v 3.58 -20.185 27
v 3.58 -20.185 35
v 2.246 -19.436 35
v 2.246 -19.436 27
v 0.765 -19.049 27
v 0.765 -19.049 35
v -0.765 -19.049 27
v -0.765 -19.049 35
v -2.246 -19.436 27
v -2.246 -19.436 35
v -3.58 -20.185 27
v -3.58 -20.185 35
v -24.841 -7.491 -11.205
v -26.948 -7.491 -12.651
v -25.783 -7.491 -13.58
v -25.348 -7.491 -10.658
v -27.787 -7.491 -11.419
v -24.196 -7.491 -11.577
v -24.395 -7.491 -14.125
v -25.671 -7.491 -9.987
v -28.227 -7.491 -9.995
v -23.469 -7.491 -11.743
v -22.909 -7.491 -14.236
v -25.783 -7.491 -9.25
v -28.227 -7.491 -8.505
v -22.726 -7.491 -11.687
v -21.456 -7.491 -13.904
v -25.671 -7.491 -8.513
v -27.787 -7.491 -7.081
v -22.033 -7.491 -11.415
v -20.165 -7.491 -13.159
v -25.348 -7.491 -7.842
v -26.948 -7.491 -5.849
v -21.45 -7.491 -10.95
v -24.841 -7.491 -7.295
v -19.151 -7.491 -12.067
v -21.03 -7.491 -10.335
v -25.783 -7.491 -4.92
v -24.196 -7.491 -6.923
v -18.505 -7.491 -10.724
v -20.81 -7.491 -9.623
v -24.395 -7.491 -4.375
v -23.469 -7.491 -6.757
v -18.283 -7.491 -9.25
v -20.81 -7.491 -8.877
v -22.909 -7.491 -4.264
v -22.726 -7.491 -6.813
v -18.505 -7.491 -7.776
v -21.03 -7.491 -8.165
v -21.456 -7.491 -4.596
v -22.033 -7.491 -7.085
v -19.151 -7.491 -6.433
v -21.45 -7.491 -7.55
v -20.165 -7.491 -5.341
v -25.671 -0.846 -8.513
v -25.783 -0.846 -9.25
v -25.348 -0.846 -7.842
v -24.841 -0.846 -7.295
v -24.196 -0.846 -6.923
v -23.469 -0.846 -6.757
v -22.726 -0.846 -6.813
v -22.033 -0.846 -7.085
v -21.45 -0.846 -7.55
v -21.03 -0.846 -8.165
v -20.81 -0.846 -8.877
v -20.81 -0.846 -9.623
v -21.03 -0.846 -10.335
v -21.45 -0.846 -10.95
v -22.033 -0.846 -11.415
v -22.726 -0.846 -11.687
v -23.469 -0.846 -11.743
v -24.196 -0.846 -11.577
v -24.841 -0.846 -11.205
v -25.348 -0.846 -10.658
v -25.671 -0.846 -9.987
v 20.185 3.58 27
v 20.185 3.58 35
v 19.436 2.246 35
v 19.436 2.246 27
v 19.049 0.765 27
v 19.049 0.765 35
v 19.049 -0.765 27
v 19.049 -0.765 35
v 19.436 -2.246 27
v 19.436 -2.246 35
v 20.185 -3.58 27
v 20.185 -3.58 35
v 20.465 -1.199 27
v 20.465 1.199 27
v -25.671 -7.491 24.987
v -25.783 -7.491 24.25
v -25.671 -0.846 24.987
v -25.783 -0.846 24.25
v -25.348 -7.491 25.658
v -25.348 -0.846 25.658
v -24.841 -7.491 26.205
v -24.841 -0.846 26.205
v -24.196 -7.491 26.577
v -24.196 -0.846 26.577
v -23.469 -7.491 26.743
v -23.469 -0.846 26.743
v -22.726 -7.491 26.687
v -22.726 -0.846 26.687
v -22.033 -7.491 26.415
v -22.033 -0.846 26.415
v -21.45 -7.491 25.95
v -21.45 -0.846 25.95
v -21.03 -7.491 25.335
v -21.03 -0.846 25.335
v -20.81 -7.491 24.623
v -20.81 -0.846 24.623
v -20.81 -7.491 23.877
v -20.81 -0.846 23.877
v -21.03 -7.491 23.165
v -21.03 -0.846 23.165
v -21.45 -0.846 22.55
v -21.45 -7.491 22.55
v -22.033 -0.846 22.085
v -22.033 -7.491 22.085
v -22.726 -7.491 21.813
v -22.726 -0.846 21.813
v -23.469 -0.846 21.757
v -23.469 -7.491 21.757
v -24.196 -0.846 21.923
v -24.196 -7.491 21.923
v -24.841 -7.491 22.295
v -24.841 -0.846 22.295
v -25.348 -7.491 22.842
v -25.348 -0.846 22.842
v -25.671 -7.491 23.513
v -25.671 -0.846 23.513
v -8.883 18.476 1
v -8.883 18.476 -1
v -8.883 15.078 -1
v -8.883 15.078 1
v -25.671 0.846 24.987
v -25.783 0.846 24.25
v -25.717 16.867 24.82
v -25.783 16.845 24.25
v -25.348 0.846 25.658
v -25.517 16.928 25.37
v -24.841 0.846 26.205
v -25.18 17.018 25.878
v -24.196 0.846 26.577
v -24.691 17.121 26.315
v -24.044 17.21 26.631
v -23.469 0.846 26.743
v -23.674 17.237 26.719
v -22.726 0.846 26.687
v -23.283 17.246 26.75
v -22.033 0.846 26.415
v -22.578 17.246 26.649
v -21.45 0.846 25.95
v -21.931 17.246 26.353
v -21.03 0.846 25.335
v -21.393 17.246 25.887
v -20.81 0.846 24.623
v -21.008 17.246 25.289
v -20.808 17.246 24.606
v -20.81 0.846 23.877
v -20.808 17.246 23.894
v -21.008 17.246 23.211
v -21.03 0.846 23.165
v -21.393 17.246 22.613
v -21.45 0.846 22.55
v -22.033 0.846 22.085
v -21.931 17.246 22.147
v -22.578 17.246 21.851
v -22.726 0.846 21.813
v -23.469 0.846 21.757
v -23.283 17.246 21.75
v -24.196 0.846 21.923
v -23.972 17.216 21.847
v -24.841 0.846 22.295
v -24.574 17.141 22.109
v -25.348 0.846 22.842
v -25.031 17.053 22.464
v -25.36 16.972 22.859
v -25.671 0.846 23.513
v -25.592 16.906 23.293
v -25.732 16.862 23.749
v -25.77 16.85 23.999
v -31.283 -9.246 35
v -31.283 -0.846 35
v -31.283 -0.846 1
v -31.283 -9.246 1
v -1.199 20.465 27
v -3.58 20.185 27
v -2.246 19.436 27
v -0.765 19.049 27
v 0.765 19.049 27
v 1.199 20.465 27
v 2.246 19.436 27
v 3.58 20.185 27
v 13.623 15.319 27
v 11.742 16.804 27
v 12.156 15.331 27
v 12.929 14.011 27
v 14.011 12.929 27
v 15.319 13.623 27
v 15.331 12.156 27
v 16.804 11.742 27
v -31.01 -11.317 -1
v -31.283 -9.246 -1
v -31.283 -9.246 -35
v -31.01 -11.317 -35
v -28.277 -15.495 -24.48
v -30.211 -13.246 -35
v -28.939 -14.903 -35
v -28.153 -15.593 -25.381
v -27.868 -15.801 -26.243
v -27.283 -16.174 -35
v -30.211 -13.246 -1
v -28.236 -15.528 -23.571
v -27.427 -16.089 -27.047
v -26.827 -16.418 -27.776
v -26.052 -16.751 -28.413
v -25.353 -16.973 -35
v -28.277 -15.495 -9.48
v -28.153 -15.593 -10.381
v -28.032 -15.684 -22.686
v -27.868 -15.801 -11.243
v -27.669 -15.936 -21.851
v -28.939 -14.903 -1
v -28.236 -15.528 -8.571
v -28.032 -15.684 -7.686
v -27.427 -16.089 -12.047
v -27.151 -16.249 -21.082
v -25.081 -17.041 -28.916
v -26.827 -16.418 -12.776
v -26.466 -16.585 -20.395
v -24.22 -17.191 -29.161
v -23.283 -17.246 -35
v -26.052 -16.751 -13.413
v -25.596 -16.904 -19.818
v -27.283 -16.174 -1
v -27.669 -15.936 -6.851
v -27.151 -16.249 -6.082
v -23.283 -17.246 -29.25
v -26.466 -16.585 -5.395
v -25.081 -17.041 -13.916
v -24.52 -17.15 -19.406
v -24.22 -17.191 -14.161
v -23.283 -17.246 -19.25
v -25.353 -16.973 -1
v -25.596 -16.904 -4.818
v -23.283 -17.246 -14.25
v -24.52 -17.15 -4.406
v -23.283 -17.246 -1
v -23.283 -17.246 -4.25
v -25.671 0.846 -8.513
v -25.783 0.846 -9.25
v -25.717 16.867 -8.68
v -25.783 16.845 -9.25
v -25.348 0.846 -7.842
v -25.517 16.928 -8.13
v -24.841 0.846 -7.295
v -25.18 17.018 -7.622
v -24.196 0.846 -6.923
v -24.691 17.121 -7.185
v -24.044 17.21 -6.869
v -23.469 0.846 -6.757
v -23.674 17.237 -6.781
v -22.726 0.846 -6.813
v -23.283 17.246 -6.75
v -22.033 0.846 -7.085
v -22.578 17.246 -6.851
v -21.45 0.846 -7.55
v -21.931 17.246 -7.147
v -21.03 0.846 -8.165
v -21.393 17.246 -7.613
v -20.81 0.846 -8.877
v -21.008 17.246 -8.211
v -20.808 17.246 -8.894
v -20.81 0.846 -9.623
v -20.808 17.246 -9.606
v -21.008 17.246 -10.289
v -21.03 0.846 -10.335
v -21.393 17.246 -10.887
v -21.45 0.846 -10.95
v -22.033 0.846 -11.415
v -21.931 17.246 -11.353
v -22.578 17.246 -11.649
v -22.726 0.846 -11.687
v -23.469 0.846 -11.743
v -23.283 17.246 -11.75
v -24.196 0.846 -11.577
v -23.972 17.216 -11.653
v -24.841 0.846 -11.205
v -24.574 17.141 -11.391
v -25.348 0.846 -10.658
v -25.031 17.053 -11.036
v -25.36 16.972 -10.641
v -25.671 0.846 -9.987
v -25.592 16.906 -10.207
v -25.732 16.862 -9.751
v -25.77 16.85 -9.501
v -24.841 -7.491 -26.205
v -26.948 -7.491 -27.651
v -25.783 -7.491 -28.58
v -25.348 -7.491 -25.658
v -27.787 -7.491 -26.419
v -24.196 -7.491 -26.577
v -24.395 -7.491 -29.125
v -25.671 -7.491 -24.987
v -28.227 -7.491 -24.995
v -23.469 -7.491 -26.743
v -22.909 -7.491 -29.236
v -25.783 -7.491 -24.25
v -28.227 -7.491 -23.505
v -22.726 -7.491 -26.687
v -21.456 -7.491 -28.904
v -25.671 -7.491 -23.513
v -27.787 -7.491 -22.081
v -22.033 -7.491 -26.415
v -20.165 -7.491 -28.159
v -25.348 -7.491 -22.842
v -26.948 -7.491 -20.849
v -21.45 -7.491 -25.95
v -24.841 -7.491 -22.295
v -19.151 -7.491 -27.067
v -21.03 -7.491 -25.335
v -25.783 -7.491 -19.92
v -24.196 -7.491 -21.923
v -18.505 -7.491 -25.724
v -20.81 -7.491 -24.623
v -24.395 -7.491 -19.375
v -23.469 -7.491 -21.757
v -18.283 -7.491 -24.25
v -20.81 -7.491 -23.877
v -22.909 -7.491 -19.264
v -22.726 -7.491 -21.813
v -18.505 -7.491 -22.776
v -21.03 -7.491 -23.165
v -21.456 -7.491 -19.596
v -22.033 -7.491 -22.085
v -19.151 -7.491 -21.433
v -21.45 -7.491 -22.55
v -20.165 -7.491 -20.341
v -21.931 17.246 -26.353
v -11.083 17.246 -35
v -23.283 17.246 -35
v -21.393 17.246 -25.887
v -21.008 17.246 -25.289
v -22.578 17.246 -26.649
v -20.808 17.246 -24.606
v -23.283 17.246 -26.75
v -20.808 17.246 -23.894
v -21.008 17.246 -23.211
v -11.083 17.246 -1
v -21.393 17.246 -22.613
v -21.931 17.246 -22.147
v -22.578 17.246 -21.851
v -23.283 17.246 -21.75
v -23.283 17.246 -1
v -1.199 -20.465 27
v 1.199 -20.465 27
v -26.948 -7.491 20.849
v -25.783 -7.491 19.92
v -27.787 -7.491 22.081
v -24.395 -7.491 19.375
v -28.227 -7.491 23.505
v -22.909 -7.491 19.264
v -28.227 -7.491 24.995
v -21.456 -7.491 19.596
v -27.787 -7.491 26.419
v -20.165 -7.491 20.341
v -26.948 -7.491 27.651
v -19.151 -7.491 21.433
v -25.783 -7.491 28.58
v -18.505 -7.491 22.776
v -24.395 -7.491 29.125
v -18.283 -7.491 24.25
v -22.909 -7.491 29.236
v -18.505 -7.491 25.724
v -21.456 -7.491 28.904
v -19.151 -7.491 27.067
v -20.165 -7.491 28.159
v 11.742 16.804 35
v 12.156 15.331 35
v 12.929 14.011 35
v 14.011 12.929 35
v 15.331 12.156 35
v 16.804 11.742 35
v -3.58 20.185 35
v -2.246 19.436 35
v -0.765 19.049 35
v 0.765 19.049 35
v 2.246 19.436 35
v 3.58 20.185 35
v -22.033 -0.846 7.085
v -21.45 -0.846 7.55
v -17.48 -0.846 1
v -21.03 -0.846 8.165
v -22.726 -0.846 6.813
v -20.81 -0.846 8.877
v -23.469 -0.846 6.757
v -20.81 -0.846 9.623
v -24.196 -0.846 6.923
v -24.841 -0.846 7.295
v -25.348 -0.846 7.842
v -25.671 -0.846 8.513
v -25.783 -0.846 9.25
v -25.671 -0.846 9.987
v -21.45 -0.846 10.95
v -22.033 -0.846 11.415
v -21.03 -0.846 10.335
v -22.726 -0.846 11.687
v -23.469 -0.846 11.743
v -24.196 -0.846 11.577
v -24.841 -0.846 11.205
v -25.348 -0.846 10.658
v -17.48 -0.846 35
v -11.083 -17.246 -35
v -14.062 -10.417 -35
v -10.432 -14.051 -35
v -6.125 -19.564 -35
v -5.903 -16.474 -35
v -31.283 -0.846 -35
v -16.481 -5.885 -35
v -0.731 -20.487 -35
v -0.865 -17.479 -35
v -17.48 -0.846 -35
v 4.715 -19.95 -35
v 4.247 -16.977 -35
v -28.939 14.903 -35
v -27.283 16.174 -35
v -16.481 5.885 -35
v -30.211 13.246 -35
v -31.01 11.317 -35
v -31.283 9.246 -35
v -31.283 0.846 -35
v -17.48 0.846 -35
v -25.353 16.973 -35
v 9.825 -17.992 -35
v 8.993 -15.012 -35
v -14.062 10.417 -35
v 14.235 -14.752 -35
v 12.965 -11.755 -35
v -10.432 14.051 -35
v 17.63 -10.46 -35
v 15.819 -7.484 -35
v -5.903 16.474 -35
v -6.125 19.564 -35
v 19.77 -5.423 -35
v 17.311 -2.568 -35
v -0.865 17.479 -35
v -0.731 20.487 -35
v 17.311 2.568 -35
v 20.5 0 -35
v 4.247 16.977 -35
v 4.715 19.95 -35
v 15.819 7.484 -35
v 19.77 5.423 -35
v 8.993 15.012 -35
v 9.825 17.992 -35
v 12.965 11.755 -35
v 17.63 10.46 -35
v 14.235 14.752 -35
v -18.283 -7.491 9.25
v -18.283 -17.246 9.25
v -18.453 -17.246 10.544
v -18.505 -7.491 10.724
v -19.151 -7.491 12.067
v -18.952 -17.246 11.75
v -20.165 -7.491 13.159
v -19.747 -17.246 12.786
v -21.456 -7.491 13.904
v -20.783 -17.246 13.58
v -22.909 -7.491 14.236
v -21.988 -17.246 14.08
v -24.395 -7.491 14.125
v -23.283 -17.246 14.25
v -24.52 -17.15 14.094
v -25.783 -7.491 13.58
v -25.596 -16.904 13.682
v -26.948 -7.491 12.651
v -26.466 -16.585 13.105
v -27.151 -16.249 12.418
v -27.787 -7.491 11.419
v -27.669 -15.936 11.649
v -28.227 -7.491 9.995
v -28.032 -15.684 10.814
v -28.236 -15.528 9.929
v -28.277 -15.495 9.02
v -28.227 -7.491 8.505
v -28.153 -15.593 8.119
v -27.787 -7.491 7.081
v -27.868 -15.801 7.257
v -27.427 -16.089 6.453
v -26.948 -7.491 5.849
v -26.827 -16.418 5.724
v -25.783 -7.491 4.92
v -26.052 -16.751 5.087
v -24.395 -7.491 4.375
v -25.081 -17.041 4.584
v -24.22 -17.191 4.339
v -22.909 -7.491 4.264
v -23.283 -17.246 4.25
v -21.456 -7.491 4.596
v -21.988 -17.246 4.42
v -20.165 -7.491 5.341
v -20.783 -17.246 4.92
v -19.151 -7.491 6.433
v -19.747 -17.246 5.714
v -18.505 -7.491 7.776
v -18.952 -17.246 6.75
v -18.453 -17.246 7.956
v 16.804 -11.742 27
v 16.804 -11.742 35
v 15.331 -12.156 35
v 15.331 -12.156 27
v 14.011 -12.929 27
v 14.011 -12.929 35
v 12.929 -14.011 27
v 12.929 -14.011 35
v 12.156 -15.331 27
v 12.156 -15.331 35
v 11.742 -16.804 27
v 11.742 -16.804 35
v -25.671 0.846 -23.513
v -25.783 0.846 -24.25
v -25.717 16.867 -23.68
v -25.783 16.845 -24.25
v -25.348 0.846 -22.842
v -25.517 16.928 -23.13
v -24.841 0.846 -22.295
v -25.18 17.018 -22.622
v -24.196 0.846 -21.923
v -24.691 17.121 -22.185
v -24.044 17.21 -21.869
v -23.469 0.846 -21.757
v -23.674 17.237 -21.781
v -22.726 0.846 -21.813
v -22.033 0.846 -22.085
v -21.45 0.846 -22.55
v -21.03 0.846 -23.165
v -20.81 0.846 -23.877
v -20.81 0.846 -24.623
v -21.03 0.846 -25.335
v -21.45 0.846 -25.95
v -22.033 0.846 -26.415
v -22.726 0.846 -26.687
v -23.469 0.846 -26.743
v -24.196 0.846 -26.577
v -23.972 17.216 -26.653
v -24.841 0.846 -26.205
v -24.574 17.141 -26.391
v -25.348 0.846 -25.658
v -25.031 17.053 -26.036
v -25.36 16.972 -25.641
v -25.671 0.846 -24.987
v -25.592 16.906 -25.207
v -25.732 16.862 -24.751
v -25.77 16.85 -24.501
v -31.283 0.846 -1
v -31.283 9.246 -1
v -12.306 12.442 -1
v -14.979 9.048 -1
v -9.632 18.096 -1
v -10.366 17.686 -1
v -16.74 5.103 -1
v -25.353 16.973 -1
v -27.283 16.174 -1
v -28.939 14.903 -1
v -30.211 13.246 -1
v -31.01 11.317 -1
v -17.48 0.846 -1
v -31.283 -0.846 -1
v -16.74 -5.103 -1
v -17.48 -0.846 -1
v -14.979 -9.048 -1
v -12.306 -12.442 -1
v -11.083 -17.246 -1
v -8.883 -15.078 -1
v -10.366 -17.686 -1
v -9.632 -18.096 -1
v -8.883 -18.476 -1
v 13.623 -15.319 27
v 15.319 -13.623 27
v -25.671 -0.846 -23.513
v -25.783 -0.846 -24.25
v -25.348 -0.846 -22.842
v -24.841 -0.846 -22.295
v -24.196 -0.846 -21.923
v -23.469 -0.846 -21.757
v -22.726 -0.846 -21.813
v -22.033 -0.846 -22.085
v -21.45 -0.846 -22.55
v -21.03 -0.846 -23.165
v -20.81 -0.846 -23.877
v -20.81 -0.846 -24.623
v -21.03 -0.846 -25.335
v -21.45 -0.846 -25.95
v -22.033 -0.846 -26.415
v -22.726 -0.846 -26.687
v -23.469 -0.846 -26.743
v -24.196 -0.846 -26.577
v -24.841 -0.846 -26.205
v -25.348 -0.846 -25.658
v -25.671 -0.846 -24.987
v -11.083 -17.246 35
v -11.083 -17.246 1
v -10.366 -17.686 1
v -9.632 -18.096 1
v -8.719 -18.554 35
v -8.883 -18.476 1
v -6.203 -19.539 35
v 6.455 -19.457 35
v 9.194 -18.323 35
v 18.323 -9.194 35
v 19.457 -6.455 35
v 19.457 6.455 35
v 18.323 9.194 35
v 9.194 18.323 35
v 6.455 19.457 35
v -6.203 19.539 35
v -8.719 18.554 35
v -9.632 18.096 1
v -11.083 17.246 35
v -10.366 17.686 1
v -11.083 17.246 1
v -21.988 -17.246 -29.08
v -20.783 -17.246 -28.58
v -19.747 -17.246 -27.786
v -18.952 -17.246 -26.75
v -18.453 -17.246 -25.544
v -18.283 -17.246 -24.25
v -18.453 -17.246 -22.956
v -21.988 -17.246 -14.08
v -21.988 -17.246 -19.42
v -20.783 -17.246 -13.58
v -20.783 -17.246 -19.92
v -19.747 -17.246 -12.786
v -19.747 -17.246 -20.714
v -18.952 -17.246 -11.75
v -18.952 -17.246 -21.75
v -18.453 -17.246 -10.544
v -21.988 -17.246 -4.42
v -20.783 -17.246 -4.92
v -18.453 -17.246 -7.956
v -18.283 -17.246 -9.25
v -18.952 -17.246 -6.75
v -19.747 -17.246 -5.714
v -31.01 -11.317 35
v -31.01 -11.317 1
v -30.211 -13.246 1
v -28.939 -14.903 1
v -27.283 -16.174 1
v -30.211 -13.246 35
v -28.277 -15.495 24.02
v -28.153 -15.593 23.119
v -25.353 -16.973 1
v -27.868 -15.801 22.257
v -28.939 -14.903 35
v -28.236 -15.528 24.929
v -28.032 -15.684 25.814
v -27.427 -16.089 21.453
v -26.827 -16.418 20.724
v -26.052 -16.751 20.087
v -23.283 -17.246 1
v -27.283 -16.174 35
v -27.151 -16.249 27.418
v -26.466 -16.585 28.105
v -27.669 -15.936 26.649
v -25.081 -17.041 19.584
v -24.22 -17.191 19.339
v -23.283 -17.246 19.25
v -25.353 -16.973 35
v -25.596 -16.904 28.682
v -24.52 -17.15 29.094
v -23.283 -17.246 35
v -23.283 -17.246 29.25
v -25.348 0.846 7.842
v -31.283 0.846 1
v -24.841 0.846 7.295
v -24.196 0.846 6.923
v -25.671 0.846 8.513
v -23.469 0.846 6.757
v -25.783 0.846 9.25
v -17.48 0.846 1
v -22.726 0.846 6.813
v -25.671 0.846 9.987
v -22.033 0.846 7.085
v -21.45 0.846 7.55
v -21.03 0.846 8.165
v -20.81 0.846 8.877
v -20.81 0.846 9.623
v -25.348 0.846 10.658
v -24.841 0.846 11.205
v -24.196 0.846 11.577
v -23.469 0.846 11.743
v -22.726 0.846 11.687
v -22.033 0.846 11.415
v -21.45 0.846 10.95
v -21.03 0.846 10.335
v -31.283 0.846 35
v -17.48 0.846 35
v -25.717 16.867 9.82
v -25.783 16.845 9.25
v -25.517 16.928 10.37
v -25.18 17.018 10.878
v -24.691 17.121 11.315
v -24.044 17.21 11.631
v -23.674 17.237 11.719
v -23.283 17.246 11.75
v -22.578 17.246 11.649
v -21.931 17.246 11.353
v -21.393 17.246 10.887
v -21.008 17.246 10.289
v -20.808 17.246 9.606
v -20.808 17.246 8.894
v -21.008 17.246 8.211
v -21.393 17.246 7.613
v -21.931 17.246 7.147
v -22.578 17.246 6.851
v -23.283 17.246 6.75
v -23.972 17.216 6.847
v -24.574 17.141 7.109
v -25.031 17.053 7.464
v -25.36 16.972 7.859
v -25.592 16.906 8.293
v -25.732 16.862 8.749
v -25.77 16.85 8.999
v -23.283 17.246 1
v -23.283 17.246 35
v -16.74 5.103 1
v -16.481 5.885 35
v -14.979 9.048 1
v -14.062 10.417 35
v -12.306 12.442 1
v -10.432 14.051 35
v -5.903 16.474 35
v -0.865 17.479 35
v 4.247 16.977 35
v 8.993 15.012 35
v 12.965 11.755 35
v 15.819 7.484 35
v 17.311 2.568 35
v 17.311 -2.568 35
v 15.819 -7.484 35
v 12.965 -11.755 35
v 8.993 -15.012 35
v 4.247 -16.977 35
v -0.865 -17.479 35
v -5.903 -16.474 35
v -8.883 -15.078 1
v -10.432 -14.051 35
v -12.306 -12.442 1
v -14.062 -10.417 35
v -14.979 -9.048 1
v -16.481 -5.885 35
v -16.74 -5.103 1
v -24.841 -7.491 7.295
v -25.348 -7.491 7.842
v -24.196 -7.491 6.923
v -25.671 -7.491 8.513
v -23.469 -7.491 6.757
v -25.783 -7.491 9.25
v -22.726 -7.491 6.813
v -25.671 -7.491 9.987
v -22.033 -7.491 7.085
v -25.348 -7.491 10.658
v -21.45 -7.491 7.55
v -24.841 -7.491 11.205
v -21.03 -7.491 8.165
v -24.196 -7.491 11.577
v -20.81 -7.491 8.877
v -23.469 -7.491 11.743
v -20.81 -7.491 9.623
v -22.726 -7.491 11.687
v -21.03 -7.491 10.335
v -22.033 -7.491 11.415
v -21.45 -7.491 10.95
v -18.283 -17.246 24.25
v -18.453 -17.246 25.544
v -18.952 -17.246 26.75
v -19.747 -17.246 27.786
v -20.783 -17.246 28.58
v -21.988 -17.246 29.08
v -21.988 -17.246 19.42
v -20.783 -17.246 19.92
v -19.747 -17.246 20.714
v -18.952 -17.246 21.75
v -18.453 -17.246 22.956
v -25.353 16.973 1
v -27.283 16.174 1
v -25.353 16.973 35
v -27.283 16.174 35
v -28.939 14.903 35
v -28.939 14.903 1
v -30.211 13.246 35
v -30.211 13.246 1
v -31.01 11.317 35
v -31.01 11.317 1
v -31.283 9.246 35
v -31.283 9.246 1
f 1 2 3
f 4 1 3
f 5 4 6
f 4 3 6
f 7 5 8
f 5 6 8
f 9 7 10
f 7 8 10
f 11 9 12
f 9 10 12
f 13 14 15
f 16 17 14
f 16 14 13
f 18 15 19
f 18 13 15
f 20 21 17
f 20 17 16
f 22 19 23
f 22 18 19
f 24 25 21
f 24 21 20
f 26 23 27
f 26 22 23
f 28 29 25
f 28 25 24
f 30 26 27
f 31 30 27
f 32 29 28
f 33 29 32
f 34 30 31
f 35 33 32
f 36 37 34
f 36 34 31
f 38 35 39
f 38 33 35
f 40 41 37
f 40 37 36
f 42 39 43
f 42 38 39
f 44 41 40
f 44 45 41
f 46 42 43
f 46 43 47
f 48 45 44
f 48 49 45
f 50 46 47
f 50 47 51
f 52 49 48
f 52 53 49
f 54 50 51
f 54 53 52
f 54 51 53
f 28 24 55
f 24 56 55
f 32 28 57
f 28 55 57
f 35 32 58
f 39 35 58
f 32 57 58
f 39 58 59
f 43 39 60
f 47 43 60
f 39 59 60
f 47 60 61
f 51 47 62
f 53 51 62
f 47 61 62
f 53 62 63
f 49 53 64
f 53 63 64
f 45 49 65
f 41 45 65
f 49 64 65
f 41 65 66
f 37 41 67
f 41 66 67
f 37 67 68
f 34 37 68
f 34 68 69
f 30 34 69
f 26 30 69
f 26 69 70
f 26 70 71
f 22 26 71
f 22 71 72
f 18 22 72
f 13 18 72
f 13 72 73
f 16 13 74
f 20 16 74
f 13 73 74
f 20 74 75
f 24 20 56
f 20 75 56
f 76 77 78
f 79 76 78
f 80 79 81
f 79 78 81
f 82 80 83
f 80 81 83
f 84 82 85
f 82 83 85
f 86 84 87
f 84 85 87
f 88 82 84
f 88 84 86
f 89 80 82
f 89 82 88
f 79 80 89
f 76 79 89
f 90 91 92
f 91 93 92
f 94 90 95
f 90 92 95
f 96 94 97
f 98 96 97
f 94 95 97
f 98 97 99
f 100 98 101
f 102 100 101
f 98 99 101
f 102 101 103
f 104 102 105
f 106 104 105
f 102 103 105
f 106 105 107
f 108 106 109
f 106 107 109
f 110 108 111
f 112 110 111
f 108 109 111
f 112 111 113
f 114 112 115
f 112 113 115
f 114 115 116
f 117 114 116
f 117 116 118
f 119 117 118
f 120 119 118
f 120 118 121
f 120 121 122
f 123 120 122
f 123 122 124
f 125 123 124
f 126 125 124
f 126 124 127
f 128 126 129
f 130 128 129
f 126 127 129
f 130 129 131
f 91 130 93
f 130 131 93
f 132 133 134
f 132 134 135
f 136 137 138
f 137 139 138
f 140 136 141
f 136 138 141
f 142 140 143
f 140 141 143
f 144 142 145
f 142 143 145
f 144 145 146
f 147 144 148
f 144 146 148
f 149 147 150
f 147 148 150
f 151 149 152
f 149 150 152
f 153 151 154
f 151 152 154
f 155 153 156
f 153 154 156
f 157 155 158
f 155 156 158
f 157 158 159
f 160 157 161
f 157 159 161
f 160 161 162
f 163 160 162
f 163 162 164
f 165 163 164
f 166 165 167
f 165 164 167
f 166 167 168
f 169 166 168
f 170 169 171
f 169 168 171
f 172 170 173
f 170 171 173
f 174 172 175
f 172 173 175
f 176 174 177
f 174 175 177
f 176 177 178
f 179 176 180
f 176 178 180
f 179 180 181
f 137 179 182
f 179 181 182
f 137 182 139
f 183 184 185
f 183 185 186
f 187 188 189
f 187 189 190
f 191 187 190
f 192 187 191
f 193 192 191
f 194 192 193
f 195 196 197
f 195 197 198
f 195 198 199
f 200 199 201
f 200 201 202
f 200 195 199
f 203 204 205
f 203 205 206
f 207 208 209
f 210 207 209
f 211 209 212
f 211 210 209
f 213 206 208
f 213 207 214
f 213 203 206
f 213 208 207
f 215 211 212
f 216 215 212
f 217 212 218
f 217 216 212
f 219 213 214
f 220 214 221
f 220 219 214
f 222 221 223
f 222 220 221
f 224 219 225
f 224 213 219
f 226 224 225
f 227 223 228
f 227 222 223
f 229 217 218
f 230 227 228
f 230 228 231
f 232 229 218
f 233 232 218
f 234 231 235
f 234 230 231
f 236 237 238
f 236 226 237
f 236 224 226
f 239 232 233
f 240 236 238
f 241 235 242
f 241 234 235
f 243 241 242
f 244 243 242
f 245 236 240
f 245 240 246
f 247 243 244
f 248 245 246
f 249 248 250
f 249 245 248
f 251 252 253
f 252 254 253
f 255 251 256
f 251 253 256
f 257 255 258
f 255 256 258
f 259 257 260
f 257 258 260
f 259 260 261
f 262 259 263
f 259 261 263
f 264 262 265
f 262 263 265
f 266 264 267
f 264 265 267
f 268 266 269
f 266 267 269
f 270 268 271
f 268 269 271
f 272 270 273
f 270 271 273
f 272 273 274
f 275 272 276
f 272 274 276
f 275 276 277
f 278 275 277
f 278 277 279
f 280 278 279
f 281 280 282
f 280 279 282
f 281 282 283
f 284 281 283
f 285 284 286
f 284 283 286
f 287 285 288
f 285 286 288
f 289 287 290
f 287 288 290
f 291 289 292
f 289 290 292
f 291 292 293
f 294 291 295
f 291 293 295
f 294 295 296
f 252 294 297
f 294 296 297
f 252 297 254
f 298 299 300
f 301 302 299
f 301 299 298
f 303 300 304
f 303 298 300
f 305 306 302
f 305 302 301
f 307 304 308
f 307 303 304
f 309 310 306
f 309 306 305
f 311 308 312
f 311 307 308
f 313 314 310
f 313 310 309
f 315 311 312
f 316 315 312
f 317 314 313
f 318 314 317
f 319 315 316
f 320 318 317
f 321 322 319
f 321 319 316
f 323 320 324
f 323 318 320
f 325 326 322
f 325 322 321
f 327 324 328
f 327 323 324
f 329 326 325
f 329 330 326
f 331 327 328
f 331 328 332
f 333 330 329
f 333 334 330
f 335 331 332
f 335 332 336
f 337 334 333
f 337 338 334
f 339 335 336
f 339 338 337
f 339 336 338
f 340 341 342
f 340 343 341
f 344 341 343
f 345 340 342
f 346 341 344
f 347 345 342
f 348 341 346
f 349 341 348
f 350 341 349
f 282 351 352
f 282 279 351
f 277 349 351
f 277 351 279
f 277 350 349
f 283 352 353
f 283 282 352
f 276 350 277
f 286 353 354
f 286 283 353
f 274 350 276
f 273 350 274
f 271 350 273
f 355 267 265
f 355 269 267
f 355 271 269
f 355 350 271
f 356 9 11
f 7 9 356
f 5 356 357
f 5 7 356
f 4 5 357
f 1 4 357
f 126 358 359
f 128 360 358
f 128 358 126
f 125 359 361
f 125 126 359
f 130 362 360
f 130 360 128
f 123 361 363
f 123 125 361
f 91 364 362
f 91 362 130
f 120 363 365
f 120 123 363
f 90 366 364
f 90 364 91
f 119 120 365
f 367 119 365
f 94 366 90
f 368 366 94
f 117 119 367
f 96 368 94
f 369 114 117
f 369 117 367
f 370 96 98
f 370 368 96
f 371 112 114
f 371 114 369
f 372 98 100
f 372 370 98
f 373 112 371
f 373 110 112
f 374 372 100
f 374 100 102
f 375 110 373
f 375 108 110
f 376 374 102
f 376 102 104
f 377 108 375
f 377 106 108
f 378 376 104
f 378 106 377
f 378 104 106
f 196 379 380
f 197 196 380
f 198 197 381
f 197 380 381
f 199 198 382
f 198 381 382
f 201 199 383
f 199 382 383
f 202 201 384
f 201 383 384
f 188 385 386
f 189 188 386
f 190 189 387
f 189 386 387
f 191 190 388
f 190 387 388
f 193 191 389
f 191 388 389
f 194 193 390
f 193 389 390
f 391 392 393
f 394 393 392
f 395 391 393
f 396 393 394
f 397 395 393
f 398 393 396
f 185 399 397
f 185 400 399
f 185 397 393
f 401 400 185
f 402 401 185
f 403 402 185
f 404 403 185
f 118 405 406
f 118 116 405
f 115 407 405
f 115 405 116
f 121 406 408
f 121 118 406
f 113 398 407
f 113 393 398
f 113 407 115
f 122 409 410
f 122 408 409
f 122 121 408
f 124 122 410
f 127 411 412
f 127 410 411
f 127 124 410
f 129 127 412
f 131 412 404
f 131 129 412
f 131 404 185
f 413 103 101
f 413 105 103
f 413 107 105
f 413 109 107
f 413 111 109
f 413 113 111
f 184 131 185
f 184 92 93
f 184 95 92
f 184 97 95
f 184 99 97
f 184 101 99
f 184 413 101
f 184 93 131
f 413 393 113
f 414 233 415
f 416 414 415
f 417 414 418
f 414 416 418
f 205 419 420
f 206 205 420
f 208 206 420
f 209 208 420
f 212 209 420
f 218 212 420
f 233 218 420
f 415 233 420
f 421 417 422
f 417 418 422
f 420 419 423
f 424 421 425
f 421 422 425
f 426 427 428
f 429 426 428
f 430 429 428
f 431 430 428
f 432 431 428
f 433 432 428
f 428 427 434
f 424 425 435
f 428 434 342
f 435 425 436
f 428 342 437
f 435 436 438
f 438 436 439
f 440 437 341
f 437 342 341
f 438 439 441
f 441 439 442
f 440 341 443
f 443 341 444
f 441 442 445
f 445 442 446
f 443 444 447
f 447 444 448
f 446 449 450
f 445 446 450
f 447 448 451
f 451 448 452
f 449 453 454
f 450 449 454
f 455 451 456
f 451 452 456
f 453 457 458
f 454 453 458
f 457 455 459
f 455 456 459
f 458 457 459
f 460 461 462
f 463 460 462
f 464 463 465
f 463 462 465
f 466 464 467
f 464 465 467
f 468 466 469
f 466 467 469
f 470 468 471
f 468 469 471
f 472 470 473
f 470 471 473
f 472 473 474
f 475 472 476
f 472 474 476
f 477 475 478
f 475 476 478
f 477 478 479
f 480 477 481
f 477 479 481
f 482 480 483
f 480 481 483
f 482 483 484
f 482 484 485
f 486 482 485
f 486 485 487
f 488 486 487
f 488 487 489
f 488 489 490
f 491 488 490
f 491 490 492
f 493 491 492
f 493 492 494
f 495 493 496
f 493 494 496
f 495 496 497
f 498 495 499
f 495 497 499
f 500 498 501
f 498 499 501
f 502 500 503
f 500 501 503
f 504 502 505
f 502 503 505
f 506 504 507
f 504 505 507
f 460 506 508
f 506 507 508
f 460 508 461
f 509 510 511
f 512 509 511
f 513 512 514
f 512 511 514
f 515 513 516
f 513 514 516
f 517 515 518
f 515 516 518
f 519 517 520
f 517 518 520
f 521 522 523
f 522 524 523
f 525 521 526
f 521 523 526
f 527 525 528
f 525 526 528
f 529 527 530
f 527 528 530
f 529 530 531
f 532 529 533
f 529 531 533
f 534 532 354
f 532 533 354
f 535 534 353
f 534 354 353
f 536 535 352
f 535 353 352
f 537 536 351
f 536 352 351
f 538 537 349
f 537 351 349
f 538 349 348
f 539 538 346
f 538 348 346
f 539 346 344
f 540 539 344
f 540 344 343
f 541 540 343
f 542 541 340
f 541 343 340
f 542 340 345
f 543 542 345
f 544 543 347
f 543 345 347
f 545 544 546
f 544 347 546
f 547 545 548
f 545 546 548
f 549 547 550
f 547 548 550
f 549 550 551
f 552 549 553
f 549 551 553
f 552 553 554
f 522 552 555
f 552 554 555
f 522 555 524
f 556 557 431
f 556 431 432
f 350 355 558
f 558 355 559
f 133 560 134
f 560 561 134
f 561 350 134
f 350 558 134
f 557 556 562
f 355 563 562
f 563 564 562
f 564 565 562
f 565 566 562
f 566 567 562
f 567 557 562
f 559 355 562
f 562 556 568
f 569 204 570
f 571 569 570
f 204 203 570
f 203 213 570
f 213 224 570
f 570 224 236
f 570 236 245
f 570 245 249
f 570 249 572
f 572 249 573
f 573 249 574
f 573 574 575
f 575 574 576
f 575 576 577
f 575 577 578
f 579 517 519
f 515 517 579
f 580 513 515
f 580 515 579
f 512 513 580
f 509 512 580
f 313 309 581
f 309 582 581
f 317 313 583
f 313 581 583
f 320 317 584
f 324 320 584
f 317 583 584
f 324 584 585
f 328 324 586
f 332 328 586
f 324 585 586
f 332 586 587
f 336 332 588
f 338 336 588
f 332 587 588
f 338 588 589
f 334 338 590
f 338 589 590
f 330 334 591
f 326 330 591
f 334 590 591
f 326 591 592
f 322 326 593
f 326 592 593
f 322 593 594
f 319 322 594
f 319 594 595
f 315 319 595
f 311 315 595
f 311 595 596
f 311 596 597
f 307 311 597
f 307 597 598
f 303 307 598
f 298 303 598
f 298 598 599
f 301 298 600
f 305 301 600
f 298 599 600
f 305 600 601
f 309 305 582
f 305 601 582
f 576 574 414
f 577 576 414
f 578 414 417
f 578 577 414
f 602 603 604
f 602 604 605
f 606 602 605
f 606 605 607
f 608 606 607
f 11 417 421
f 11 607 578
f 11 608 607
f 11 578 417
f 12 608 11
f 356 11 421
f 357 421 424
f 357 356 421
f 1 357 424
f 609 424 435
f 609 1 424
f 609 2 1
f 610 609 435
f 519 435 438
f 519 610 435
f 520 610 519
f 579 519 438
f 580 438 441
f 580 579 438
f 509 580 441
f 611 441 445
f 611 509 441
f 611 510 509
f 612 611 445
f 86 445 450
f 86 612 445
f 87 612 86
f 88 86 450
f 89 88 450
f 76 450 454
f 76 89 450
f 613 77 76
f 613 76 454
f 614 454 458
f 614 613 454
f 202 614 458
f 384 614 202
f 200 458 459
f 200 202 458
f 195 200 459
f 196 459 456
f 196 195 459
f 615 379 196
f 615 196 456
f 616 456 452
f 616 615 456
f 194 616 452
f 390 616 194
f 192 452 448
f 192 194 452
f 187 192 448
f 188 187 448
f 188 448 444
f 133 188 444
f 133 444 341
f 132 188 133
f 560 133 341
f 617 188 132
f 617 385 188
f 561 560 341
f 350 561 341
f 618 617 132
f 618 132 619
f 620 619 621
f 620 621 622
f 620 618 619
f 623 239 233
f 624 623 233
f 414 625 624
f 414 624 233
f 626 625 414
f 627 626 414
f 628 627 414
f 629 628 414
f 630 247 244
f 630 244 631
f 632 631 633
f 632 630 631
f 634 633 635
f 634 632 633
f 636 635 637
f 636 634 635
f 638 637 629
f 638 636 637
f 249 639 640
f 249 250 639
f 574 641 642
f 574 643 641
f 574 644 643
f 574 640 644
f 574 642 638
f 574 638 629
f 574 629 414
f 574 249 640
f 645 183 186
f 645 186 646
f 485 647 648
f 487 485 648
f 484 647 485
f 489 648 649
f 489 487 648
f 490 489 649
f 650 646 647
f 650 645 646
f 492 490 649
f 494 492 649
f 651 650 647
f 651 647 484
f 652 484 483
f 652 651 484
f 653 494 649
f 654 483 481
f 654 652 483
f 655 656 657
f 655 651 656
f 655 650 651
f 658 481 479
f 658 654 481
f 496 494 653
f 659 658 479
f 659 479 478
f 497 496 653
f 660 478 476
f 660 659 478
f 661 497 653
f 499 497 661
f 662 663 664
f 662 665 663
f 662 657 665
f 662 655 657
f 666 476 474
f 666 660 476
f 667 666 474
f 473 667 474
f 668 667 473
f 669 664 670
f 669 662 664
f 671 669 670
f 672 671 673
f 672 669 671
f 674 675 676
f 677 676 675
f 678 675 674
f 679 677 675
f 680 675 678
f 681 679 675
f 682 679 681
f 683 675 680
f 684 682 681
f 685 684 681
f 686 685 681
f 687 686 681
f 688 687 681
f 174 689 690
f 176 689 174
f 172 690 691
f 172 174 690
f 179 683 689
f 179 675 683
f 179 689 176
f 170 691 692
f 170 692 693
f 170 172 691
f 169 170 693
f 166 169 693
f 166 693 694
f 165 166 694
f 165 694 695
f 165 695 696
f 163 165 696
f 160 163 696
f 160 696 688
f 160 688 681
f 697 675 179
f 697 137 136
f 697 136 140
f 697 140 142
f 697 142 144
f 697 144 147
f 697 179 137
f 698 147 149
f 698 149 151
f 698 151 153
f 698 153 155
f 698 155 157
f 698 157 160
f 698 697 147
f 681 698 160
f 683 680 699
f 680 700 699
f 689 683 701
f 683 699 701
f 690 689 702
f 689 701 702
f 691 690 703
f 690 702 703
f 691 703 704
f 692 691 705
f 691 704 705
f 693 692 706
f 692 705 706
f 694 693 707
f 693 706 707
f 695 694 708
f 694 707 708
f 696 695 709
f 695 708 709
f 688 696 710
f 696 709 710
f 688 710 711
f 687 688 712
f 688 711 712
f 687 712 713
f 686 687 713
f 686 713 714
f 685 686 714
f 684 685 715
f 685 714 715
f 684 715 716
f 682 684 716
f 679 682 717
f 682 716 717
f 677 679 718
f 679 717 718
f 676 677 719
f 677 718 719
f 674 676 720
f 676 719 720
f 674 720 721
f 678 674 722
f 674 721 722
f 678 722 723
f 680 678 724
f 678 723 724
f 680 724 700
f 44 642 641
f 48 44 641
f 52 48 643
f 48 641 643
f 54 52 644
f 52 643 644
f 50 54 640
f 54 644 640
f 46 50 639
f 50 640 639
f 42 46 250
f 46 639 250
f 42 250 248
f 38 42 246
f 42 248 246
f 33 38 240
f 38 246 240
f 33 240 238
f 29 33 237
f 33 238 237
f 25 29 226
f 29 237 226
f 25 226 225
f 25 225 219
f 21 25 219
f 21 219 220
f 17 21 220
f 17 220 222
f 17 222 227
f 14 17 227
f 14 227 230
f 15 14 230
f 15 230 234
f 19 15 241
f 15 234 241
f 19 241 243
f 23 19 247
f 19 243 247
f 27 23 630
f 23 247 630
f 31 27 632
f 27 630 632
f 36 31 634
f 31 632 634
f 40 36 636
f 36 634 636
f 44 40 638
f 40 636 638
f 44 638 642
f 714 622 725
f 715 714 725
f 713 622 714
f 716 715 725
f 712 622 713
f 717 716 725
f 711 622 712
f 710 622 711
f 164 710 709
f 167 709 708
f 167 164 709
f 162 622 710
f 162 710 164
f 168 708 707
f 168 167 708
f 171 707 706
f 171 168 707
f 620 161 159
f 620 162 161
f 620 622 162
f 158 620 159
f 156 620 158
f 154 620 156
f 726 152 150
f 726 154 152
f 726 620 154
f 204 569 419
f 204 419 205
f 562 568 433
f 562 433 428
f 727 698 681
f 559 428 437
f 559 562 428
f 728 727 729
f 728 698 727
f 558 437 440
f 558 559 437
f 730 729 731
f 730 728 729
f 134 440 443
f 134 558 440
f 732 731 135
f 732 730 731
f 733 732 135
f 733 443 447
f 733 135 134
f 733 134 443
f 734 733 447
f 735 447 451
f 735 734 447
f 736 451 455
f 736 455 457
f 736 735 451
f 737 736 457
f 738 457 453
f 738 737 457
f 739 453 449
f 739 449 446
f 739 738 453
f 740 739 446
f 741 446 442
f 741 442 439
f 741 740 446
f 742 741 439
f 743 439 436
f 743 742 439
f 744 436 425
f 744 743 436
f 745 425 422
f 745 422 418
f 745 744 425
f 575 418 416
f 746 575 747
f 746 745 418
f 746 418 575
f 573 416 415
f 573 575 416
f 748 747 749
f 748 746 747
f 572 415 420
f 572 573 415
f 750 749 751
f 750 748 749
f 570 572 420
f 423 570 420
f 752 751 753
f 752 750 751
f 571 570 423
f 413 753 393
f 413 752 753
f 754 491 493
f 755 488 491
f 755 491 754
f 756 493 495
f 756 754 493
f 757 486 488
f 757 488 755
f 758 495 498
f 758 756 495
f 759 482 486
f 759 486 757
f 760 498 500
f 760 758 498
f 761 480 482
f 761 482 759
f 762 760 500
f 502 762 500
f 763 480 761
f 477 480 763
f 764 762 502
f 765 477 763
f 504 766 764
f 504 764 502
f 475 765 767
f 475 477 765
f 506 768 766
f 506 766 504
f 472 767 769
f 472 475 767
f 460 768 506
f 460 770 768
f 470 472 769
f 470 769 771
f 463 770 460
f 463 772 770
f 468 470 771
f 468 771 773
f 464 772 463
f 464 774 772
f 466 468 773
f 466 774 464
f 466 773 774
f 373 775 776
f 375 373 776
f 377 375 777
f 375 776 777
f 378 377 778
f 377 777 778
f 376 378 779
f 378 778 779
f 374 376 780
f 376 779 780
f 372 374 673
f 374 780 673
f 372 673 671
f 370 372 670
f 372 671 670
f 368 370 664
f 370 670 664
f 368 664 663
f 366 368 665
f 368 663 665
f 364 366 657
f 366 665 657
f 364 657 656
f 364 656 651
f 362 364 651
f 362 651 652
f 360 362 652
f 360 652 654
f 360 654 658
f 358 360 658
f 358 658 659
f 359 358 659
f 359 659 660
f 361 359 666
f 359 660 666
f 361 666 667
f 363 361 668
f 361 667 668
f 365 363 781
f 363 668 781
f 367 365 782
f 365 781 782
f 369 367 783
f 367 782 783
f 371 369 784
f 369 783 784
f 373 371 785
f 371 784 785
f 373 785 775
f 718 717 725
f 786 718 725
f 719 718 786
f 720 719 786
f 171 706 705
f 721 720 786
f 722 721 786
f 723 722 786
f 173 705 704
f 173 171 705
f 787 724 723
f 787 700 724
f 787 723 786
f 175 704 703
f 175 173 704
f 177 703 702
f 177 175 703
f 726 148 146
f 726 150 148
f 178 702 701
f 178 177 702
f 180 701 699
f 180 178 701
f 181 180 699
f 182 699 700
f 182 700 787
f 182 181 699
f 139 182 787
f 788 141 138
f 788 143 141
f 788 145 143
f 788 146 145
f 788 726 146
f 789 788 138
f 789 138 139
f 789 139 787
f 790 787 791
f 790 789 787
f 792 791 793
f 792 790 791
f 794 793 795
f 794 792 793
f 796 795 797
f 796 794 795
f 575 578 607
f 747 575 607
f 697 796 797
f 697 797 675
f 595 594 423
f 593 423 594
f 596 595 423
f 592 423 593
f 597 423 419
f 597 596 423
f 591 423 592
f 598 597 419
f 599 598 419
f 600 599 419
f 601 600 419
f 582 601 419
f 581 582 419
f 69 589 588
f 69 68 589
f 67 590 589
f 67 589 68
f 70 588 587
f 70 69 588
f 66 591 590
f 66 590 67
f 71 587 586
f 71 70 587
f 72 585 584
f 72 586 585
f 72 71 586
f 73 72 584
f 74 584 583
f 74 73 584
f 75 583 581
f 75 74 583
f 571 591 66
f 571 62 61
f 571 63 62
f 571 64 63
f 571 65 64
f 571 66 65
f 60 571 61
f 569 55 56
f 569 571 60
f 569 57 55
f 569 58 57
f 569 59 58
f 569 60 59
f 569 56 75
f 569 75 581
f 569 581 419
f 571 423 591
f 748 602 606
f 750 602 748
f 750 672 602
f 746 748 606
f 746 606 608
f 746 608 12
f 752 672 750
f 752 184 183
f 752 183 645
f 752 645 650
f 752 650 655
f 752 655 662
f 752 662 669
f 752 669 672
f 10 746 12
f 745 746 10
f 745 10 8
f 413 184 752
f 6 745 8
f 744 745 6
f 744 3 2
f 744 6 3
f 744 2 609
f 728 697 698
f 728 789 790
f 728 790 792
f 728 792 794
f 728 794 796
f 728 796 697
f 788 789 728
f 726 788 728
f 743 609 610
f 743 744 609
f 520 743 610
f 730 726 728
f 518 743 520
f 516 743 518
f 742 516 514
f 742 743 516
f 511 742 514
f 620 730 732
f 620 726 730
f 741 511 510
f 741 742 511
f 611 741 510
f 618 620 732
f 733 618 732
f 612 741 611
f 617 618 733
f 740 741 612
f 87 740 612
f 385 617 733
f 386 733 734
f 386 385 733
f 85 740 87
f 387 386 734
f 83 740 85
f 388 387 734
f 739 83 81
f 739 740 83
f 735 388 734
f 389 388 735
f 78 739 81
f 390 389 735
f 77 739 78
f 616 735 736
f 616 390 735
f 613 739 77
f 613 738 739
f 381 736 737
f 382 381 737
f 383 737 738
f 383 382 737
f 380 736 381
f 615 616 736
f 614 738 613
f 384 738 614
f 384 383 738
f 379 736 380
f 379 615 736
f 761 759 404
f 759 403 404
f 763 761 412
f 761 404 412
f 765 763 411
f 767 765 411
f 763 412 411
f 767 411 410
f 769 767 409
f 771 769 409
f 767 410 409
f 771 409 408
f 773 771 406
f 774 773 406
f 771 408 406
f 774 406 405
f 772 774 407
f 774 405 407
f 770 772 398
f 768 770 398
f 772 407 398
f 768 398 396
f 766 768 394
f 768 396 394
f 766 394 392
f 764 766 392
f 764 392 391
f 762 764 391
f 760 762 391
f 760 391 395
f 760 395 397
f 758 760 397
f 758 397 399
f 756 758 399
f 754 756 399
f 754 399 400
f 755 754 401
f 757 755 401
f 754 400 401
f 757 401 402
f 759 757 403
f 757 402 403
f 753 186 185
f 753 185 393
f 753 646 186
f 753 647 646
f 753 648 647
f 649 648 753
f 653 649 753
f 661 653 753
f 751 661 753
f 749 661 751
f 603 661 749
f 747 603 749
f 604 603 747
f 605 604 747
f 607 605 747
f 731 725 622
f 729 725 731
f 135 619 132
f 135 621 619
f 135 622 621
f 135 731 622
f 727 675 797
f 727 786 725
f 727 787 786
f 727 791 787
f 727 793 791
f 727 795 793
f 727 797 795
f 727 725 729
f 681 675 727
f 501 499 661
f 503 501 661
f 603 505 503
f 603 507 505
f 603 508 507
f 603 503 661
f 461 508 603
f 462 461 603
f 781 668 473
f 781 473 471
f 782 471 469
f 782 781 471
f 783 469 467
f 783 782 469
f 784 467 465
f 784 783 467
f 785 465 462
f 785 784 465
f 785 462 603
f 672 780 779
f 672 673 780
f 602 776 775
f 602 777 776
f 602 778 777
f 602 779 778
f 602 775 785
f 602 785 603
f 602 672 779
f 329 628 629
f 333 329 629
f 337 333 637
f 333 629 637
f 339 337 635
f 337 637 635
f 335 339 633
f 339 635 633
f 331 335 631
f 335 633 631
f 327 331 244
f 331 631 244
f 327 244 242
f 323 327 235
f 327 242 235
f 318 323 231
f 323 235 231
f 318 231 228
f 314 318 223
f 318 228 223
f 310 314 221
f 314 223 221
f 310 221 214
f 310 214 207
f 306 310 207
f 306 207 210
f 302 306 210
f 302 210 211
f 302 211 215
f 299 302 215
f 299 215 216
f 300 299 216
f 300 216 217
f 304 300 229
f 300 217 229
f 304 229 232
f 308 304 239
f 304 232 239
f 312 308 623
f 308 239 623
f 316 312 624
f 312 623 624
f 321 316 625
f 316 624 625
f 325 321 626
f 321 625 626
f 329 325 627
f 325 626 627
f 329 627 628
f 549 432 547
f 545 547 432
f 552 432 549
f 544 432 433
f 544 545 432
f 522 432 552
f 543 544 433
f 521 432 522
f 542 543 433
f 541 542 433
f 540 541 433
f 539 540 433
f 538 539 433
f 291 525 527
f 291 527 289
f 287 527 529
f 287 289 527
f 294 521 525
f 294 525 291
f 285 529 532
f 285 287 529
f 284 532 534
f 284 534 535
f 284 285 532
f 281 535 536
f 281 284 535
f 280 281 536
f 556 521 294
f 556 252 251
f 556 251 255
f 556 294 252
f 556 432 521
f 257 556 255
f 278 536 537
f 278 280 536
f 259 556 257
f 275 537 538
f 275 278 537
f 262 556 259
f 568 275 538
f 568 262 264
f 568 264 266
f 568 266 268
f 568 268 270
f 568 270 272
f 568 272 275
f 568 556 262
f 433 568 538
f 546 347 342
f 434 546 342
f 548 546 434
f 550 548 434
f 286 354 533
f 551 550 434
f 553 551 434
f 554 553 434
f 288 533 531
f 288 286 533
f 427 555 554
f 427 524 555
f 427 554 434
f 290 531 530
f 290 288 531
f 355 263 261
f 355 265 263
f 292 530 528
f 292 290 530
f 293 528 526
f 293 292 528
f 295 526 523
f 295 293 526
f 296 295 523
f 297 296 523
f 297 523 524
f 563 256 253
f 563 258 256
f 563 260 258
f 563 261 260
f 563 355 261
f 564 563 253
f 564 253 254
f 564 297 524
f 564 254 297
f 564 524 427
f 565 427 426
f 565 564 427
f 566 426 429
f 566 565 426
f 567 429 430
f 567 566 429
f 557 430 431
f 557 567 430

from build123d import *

# Parameters (mm, degrees)
F1_DEPTH       = 35
F3_D           = 5
F3_START       = 1.7550021
F3_CBORE_D     = 10
F3_CBORE_DEPTH = 8
F4_W           = 22.4
F4_H           = 2
F5_DEPTH       = 350
F7_DEPTH       = 8


with BuildPart() as f1:
    # F0 (on Top) → F1 (new body, symmetric)
    with BuildSketch(Plane.XY):
        with BuildLine():
            ThreePointArc((-17.4795348609, 0.84608572), (17.5, 0), (-17.4795348609, -0.84608572))
            Line((-17.4795348609, -0.84608572), (-20.4825325327, -0.84608572))
            Line((-20.4825325327, -0.84608572), (-31.2825325327, -0.84608572))
            Line((-31.2825325327, -0.84608572), (-31.2825325327, -9.24608572))
            ThreePointArc((-31.2825325327, -9.24608572), (-28.9393867822, -14.9029399695), (-23.2825325327, -17.24608572))
            Line((-23.2825325327, -17.24608572), (-11.0825325327, -17.24608572))
            ThreePointArc((-11.0825325327, -17.24608572), (20.5, 0), (-11.0825325327, 17.24608572))
            Line((-11.0825325327, 17.24608572), (-23.2825325327, 17.24608572))
            ThreePointArc((-23.2825325327, 17.24608572), (-28.9393867822, 14.9029399695), (-31.2825325327, 9.24608572))
            Line((-31.2825325327, 9.24608572), (-31.2825325327, 0.84608572))
            Line((-31.2825325327, 0.84608572), (-20.4825325327, 0.84608572))
            Line((-20.4825325327, 0.84608572), (-17.4795348609, 0.84608572))
        make_face()
    extrude(amount=F1_DEPTH, both=True)

    # F3 (through all)
    # its depths count from where the whole tool has entered the part; down to there all is cleared
    with Locations(Plane.XZ.offset(17.24608572).offset(-F3_START)):
        with Locations((-23.2825325327, -24.25), (-23.2825325327, -9.25), (-23.2825325327, 9.25), (-23.2825325327, 24.25)):
            CounterBoreHole(F3_D / 2, F3_CBORE_D / 2, F3_CBORE_DEPTH)

    # F4 (on face) → F5 (cut, symmetric)
    with BuildSketch(Plane.XZ.offset(17.24608572)):
        with Locations((-20.0825325327, 0)):
            Rectangle(F4_W, F4_H)
    extrude(amount=F5_DEPTH, both=True, mode=Mode.SUBTRACT)

    # F6 (on face) → F7 (cut)
    with BuildSketch(Plane.XY.offset(35)):
        with BuildLine():
            ThreePointArc((-3.5799127084, -20.185), (0, -20.5), (3.5799127084, -20.185))
            ThreePointArc((3.5799127084, -20.185), (0, -19), (-3.5799127084, -20.185))
        make_face()
        with BuildLine():
            ThreePointArc((16.8043309304, -11.7415698261), (13.4350288425, -13.4350288425), (11.7415698261, -16.8043309304))
            ThreePointArc((11.7415698261, -16.8043309304), (14.4956890143, -14.4956890143), (16.8043309304, -11.7415698261))
        make_face()
        with BuildLine():
            ThreePointArc((20.185, 3.5799127084), (19, 0), (20.185, -3.5799127084))
            ThreePointArc((20.185, -3.5799127084), (20.5, 0), (20.185, 3.5799127084))
        make_face()
        with BuildLine():
            ThreePointArc((11.7415698261, 16.8043309304), (13.4350288425, 13.4350288425), (16.8043309304, 11.7415698261))
            ThreePointArc((16.8043309304, 11.7415698261), (14.4956890143, 14.4956890143), (11.7415698261, 16.8043309304))
        make_face()
        with BuildLine():
            ThreePointArc((-3.5799127084, 20.185), (0, 19), (3.5799127084, 20.185))
            ThreePointArc((3.5799127084, 20.185), (0, 20.5), (-3.5799127084, 20.185))
        make_face()
    extrude(amount=-F7_DEPTH, mode=Mode.SUBTRACT)


solid = f1.part
